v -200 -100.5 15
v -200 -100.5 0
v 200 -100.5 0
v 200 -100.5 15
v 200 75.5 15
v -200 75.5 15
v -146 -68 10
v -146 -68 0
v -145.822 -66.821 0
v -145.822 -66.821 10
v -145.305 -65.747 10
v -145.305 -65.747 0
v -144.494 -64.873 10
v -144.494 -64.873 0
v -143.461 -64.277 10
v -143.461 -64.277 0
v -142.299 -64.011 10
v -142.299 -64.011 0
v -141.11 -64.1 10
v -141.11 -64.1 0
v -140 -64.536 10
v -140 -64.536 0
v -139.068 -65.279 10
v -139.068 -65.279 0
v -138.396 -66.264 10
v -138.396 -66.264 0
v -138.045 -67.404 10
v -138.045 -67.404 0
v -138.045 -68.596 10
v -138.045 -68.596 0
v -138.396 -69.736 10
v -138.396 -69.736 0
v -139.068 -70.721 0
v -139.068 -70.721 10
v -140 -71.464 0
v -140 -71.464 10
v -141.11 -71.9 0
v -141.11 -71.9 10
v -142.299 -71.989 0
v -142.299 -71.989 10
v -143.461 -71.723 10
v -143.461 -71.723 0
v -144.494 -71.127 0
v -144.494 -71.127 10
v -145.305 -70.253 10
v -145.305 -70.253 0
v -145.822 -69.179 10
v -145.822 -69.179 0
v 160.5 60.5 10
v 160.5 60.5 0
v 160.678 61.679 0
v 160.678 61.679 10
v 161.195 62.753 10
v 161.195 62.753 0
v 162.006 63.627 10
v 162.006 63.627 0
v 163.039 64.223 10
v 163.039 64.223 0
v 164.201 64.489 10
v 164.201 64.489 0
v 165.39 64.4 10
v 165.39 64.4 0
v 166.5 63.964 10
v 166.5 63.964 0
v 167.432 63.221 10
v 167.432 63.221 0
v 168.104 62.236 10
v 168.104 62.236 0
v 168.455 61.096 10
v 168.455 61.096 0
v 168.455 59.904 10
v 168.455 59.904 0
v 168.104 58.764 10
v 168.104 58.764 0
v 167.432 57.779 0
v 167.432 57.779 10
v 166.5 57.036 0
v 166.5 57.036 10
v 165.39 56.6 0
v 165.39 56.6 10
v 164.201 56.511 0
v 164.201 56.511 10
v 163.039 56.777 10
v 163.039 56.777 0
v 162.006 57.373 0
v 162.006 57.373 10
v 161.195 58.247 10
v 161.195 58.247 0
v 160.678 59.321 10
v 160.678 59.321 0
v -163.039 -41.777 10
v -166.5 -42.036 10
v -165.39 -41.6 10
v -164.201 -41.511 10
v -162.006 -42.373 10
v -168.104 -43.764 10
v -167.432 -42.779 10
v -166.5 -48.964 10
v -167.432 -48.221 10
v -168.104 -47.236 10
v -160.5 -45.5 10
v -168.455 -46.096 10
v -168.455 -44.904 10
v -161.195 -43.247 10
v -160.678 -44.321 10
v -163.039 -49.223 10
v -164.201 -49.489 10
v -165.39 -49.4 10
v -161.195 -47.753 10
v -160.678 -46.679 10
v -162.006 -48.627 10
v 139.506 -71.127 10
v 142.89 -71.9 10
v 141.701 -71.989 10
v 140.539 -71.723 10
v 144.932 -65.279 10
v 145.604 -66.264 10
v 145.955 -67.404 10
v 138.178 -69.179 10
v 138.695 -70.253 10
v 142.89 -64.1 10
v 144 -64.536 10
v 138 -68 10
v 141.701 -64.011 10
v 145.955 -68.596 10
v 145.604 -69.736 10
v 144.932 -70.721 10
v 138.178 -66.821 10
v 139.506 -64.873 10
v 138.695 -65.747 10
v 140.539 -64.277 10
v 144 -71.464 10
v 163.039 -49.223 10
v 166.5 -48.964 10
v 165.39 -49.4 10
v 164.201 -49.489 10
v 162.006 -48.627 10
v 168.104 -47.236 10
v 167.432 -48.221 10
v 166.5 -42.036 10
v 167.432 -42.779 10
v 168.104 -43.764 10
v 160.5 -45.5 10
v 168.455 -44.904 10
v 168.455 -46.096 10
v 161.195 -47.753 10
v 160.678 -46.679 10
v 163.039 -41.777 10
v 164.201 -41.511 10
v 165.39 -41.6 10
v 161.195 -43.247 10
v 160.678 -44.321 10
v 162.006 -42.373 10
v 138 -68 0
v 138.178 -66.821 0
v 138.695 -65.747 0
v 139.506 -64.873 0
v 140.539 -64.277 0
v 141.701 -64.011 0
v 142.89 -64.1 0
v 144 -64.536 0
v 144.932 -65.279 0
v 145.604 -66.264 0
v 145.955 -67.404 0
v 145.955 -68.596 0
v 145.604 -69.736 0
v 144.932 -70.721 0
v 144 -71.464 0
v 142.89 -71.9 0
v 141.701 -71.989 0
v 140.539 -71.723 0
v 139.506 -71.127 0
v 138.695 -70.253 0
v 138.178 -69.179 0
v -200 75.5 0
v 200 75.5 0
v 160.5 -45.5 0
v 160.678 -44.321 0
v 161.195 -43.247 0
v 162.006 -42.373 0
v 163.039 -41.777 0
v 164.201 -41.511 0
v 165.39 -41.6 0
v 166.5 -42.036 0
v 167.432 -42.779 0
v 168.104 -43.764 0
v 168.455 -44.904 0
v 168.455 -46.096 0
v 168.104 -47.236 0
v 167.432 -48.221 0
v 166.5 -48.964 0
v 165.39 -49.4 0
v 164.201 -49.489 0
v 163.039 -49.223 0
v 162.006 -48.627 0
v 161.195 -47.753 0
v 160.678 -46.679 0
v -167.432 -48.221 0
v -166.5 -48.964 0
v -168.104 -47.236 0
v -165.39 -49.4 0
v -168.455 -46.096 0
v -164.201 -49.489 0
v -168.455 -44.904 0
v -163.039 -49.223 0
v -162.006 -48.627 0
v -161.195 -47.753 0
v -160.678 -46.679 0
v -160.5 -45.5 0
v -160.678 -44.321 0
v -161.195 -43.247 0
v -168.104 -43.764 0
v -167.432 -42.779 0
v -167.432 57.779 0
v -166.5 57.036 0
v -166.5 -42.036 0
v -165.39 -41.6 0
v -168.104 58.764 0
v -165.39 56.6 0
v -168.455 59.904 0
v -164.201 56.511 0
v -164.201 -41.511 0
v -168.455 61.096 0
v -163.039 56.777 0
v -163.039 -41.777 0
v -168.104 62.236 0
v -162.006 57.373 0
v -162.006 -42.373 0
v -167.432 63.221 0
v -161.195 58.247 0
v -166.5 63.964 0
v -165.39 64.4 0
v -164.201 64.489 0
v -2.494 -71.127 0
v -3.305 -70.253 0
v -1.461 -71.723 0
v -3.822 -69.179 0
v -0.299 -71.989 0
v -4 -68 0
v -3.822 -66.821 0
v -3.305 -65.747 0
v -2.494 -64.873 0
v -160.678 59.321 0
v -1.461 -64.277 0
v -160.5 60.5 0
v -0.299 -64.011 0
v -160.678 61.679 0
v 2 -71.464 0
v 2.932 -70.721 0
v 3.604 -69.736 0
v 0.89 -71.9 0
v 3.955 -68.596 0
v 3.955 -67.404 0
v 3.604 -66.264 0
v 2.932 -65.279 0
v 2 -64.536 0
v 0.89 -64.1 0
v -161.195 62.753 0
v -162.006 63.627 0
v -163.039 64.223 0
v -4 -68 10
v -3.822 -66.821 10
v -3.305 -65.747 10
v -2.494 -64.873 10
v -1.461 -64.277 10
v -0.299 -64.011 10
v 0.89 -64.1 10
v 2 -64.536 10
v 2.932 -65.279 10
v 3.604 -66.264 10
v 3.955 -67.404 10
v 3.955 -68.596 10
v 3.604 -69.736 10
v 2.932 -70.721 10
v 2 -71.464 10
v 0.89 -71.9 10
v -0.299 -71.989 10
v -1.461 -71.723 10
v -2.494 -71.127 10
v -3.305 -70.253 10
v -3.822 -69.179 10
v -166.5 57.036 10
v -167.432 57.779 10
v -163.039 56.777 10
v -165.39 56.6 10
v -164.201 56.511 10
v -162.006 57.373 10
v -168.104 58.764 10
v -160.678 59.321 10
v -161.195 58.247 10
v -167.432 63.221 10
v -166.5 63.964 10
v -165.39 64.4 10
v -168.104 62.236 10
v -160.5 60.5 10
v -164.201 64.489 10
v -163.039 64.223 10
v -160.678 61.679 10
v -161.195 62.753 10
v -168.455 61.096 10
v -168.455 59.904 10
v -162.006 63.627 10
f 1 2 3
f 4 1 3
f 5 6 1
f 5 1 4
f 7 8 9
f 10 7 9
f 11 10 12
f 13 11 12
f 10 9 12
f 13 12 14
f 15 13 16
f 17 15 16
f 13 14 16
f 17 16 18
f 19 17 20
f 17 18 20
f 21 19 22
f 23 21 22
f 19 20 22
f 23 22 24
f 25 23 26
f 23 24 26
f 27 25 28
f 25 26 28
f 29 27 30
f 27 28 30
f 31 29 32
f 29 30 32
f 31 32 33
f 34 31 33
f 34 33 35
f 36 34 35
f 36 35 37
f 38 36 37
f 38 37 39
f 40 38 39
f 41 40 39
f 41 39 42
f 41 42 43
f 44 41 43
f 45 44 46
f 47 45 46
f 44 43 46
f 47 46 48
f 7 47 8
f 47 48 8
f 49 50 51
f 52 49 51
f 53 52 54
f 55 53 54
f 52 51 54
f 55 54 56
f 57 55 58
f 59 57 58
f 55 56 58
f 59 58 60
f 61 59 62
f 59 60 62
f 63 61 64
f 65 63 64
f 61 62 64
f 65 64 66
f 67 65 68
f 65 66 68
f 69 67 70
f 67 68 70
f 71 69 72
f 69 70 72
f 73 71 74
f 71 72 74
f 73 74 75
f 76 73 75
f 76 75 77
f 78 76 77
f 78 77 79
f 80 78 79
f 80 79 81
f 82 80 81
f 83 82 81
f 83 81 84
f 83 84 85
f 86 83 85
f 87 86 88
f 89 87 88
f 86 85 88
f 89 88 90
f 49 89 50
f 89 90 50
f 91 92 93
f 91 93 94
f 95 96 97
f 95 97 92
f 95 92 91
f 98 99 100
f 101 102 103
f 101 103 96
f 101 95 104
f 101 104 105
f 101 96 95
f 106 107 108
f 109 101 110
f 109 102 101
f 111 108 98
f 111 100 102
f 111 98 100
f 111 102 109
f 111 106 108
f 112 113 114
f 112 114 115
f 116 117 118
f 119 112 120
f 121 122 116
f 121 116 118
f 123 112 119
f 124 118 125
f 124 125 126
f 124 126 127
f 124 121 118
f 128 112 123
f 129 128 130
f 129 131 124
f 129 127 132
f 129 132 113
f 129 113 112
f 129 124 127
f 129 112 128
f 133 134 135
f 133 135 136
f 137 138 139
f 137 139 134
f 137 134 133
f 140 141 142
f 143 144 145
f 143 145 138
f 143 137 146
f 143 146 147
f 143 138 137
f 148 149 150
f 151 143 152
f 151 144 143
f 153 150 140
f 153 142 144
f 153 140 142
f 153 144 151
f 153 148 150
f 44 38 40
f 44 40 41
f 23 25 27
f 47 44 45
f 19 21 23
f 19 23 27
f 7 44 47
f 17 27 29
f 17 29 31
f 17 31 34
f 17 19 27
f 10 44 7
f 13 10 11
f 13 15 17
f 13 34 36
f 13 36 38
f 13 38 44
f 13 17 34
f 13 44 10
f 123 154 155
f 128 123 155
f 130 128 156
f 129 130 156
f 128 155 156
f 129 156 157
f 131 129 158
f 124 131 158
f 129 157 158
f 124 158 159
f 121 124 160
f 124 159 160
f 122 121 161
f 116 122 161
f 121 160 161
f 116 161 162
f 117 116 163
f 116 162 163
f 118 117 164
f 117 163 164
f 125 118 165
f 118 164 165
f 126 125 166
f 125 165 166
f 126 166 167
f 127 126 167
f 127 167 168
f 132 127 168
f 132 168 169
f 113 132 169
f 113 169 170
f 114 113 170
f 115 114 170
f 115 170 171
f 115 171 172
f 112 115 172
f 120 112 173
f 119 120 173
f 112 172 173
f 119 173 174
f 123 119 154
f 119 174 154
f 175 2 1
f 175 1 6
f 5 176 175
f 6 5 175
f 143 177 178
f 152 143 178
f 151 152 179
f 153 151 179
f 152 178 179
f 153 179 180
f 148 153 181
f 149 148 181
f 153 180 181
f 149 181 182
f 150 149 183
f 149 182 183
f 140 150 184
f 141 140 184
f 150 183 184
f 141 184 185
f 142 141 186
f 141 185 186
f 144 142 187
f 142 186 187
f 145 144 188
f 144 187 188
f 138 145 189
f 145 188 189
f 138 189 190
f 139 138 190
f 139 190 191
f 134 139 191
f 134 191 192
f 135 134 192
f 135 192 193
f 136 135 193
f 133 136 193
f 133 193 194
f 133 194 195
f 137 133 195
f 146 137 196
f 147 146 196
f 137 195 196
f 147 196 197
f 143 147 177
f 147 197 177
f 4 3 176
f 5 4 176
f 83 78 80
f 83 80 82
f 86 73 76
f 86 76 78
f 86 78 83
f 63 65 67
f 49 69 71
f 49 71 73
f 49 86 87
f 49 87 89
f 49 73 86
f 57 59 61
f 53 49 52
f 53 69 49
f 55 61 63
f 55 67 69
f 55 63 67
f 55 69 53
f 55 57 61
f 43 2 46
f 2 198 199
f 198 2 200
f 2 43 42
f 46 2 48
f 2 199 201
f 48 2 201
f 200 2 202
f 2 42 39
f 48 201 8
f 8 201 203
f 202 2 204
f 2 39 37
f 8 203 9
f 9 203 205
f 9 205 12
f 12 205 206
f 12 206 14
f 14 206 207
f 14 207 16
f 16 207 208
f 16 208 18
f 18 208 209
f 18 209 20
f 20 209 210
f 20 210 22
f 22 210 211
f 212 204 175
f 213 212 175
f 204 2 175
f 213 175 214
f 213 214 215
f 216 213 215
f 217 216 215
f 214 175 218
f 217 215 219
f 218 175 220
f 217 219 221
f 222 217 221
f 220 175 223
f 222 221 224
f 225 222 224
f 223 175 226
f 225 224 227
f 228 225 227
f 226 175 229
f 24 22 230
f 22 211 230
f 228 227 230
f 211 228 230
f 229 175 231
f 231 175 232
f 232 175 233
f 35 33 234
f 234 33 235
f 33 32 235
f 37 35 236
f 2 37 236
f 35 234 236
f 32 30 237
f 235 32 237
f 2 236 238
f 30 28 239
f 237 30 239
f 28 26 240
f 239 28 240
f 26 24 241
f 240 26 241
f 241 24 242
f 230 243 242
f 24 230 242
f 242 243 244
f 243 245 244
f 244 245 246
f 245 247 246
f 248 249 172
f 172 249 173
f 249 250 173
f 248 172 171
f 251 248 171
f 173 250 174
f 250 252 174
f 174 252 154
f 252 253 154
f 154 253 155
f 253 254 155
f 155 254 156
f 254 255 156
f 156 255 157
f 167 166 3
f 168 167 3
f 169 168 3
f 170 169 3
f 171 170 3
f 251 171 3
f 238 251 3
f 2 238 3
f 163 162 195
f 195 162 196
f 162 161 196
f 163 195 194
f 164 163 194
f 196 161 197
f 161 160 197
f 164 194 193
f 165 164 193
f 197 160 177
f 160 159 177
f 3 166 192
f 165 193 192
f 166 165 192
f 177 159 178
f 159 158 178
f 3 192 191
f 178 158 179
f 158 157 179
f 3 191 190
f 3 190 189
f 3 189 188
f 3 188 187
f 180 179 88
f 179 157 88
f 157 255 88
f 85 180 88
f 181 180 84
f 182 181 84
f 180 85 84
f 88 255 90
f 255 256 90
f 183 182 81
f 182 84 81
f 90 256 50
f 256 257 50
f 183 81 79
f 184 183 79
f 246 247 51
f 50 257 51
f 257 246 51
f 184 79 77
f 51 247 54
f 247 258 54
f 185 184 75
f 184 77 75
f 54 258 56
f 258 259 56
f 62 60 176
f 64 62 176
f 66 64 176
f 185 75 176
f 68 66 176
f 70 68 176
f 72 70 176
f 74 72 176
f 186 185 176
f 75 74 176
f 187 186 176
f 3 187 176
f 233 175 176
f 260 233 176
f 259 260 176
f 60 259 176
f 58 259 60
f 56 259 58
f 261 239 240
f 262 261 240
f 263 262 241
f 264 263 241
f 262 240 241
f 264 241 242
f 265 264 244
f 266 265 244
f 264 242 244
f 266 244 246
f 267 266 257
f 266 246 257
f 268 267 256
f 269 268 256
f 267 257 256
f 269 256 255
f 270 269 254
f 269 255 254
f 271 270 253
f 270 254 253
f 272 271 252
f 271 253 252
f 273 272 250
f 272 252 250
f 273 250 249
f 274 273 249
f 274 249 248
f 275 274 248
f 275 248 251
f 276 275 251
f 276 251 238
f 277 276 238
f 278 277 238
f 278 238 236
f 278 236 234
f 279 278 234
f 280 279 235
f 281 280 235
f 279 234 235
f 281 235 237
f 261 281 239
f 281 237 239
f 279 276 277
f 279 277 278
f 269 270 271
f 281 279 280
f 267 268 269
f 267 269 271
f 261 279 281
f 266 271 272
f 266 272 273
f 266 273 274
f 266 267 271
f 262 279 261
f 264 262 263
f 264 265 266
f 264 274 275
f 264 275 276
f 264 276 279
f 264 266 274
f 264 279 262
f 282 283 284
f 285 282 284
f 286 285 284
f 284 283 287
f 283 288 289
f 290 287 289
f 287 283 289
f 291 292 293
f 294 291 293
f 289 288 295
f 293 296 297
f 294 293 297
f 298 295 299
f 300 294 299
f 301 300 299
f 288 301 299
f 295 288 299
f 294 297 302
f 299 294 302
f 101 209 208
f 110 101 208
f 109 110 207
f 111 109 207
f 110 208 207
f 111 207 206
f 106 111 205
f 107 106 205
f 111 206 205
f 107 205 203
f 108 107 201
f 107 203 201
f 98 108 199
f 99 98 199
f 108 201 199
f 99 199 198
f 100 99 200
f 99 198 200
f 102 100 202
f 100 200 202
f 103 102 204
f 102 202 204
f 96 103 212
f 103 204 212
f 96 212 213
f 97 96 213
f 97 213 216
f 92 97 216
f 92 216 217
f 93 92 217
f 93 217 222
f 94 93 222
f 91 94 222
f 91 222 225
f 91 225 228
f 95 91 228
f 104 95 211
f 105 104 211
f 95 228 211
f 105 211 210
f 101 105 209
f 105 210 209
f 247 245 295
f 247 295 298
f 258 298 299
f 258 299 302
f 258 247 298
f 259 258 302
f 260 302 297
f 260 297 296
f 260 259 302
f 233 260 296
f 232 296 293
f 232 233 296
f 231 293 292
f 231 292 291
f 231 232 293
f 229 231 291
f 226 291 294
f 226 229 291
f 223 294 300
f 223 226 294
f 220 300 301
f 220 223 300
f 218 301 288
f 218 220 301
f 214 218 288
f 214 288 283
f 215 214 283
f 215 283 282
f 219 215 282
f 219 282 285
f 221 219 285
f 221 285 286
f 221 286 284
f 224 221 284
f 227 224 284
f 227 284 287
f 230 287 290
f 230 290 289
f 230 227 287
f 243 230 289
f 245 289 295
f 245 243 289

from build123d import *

# Parameters (mm, degrees)
BOSS_EXTRUDE1_DEPTH     = 15
SKETCH2_R               = 4
CUT_EXTRUDE1_DEPTH      = 10
LPATTERN1_COUNT         = 3
LPATTERN1_PITCH         = 142
SKETCH3_R               = 4
CUT_EXTRUDE2_DEPTH      = 10
LPATTERN2_COUNT         = 2
LPATTERN2_PITCH         = 106
MIRROR1_COPY_1_SKETCH_R = 4
MIRROR1_COPY_1_DEPTH    = 10
SKETCH4_W               = 400
SKETCH4_H               = 15
BOSS_EXTRUDE2_DEPTH     = 15


with BuildPart() as part:
    # Sketch1 → Boss-Extrude1 (new body)
    with BuildSketch(Plane.XY):
        Polygon((-200, -75.5), (-200, -85.5), (200, -85.5), (200, -75.5), (200, 75.5), (-200, 75.5), align=None)
    extrude(amount=BOSS_EXTRUDE1_DEPTH)

    # Sketch2 → Cut-Extrude1 (cut)
    with BuildSketch(Plane(origin=(0, 0, 0), x_dir=(-1, 0, 0), z_dir=(0, 0, -1))):
        with Locations((-142, -68)):
            Circle(SKETCH2_R)
    cut_extrude1 = extrude(amount=-CUT_EXTRUDE1_DEPTH, mode=Mode.SUBTRACT)

    # LPattern1: Cut-Extrude1 ×3
    with Locations(*[(-i * LPATTERN1_PITCH, 0, 0) for i in range(1, LPATTERN1_COUNT)]):
        add(cut_extrude1, mode=Mode.SUBTRACT)

    # Sketch3 → Cut-Extrude2 (cut)
    with BuildSketch(Plane(origin=(0, 0, 0), x_dir=(-1, 0, 0), z_dir=(0, 0, -1))):
        with Locations((-164.5, 60.5)):
            Circle(SKETCH3_R)
    cut_extrude2 = extrude(amount=-CUT_EXTRUDE2_DEPTH, mode=Mode.SUBTRACT)

    # LPattern2: Cut-Extrude2 ×2
    with Locations(*[(0, -i * LPATTERN2_PITCH, 0) for i in range(1, LPATTERN2_COUNT)]):
        add(cut_extrude2, mode=Mode.SUBTRACT)

    # Mirror1: Cut-Extrude2 across plane
    add(cut_extrude2.mirror(Plane(origin=(0, 0, 0), x_dir=(0, 0, 1), z_dir=(1, 0, 0))), mode=Mode.SUBTRACT)

    # Mirror1 copy 1 sketch → Mirror1 copy 1 (cut)
    with BuildSketch(Plane(origin=(0, -106, 0), x_dir=(1, 0, 0), z_dir=(0, 0, -1))):
        with Locations((-164.5, -60.5)):
            Circle(MIRROR1_COPY_1_SKETCH_R)
    extrude(amount=-MIRROR1_COPY_1_DEPTH, mode=Mode.SUBTRACT)

    # Sketch4 → Boss-Extrude2 (add)
    with BuildSketch(Plane.XY):
        with Locations((0, -93)):
            Rectangle(SKETCH4_W, SKETCH4_H)
    extrude(amount=BOSS_EXTRUDE2_DEPTH)


solid = part.part
